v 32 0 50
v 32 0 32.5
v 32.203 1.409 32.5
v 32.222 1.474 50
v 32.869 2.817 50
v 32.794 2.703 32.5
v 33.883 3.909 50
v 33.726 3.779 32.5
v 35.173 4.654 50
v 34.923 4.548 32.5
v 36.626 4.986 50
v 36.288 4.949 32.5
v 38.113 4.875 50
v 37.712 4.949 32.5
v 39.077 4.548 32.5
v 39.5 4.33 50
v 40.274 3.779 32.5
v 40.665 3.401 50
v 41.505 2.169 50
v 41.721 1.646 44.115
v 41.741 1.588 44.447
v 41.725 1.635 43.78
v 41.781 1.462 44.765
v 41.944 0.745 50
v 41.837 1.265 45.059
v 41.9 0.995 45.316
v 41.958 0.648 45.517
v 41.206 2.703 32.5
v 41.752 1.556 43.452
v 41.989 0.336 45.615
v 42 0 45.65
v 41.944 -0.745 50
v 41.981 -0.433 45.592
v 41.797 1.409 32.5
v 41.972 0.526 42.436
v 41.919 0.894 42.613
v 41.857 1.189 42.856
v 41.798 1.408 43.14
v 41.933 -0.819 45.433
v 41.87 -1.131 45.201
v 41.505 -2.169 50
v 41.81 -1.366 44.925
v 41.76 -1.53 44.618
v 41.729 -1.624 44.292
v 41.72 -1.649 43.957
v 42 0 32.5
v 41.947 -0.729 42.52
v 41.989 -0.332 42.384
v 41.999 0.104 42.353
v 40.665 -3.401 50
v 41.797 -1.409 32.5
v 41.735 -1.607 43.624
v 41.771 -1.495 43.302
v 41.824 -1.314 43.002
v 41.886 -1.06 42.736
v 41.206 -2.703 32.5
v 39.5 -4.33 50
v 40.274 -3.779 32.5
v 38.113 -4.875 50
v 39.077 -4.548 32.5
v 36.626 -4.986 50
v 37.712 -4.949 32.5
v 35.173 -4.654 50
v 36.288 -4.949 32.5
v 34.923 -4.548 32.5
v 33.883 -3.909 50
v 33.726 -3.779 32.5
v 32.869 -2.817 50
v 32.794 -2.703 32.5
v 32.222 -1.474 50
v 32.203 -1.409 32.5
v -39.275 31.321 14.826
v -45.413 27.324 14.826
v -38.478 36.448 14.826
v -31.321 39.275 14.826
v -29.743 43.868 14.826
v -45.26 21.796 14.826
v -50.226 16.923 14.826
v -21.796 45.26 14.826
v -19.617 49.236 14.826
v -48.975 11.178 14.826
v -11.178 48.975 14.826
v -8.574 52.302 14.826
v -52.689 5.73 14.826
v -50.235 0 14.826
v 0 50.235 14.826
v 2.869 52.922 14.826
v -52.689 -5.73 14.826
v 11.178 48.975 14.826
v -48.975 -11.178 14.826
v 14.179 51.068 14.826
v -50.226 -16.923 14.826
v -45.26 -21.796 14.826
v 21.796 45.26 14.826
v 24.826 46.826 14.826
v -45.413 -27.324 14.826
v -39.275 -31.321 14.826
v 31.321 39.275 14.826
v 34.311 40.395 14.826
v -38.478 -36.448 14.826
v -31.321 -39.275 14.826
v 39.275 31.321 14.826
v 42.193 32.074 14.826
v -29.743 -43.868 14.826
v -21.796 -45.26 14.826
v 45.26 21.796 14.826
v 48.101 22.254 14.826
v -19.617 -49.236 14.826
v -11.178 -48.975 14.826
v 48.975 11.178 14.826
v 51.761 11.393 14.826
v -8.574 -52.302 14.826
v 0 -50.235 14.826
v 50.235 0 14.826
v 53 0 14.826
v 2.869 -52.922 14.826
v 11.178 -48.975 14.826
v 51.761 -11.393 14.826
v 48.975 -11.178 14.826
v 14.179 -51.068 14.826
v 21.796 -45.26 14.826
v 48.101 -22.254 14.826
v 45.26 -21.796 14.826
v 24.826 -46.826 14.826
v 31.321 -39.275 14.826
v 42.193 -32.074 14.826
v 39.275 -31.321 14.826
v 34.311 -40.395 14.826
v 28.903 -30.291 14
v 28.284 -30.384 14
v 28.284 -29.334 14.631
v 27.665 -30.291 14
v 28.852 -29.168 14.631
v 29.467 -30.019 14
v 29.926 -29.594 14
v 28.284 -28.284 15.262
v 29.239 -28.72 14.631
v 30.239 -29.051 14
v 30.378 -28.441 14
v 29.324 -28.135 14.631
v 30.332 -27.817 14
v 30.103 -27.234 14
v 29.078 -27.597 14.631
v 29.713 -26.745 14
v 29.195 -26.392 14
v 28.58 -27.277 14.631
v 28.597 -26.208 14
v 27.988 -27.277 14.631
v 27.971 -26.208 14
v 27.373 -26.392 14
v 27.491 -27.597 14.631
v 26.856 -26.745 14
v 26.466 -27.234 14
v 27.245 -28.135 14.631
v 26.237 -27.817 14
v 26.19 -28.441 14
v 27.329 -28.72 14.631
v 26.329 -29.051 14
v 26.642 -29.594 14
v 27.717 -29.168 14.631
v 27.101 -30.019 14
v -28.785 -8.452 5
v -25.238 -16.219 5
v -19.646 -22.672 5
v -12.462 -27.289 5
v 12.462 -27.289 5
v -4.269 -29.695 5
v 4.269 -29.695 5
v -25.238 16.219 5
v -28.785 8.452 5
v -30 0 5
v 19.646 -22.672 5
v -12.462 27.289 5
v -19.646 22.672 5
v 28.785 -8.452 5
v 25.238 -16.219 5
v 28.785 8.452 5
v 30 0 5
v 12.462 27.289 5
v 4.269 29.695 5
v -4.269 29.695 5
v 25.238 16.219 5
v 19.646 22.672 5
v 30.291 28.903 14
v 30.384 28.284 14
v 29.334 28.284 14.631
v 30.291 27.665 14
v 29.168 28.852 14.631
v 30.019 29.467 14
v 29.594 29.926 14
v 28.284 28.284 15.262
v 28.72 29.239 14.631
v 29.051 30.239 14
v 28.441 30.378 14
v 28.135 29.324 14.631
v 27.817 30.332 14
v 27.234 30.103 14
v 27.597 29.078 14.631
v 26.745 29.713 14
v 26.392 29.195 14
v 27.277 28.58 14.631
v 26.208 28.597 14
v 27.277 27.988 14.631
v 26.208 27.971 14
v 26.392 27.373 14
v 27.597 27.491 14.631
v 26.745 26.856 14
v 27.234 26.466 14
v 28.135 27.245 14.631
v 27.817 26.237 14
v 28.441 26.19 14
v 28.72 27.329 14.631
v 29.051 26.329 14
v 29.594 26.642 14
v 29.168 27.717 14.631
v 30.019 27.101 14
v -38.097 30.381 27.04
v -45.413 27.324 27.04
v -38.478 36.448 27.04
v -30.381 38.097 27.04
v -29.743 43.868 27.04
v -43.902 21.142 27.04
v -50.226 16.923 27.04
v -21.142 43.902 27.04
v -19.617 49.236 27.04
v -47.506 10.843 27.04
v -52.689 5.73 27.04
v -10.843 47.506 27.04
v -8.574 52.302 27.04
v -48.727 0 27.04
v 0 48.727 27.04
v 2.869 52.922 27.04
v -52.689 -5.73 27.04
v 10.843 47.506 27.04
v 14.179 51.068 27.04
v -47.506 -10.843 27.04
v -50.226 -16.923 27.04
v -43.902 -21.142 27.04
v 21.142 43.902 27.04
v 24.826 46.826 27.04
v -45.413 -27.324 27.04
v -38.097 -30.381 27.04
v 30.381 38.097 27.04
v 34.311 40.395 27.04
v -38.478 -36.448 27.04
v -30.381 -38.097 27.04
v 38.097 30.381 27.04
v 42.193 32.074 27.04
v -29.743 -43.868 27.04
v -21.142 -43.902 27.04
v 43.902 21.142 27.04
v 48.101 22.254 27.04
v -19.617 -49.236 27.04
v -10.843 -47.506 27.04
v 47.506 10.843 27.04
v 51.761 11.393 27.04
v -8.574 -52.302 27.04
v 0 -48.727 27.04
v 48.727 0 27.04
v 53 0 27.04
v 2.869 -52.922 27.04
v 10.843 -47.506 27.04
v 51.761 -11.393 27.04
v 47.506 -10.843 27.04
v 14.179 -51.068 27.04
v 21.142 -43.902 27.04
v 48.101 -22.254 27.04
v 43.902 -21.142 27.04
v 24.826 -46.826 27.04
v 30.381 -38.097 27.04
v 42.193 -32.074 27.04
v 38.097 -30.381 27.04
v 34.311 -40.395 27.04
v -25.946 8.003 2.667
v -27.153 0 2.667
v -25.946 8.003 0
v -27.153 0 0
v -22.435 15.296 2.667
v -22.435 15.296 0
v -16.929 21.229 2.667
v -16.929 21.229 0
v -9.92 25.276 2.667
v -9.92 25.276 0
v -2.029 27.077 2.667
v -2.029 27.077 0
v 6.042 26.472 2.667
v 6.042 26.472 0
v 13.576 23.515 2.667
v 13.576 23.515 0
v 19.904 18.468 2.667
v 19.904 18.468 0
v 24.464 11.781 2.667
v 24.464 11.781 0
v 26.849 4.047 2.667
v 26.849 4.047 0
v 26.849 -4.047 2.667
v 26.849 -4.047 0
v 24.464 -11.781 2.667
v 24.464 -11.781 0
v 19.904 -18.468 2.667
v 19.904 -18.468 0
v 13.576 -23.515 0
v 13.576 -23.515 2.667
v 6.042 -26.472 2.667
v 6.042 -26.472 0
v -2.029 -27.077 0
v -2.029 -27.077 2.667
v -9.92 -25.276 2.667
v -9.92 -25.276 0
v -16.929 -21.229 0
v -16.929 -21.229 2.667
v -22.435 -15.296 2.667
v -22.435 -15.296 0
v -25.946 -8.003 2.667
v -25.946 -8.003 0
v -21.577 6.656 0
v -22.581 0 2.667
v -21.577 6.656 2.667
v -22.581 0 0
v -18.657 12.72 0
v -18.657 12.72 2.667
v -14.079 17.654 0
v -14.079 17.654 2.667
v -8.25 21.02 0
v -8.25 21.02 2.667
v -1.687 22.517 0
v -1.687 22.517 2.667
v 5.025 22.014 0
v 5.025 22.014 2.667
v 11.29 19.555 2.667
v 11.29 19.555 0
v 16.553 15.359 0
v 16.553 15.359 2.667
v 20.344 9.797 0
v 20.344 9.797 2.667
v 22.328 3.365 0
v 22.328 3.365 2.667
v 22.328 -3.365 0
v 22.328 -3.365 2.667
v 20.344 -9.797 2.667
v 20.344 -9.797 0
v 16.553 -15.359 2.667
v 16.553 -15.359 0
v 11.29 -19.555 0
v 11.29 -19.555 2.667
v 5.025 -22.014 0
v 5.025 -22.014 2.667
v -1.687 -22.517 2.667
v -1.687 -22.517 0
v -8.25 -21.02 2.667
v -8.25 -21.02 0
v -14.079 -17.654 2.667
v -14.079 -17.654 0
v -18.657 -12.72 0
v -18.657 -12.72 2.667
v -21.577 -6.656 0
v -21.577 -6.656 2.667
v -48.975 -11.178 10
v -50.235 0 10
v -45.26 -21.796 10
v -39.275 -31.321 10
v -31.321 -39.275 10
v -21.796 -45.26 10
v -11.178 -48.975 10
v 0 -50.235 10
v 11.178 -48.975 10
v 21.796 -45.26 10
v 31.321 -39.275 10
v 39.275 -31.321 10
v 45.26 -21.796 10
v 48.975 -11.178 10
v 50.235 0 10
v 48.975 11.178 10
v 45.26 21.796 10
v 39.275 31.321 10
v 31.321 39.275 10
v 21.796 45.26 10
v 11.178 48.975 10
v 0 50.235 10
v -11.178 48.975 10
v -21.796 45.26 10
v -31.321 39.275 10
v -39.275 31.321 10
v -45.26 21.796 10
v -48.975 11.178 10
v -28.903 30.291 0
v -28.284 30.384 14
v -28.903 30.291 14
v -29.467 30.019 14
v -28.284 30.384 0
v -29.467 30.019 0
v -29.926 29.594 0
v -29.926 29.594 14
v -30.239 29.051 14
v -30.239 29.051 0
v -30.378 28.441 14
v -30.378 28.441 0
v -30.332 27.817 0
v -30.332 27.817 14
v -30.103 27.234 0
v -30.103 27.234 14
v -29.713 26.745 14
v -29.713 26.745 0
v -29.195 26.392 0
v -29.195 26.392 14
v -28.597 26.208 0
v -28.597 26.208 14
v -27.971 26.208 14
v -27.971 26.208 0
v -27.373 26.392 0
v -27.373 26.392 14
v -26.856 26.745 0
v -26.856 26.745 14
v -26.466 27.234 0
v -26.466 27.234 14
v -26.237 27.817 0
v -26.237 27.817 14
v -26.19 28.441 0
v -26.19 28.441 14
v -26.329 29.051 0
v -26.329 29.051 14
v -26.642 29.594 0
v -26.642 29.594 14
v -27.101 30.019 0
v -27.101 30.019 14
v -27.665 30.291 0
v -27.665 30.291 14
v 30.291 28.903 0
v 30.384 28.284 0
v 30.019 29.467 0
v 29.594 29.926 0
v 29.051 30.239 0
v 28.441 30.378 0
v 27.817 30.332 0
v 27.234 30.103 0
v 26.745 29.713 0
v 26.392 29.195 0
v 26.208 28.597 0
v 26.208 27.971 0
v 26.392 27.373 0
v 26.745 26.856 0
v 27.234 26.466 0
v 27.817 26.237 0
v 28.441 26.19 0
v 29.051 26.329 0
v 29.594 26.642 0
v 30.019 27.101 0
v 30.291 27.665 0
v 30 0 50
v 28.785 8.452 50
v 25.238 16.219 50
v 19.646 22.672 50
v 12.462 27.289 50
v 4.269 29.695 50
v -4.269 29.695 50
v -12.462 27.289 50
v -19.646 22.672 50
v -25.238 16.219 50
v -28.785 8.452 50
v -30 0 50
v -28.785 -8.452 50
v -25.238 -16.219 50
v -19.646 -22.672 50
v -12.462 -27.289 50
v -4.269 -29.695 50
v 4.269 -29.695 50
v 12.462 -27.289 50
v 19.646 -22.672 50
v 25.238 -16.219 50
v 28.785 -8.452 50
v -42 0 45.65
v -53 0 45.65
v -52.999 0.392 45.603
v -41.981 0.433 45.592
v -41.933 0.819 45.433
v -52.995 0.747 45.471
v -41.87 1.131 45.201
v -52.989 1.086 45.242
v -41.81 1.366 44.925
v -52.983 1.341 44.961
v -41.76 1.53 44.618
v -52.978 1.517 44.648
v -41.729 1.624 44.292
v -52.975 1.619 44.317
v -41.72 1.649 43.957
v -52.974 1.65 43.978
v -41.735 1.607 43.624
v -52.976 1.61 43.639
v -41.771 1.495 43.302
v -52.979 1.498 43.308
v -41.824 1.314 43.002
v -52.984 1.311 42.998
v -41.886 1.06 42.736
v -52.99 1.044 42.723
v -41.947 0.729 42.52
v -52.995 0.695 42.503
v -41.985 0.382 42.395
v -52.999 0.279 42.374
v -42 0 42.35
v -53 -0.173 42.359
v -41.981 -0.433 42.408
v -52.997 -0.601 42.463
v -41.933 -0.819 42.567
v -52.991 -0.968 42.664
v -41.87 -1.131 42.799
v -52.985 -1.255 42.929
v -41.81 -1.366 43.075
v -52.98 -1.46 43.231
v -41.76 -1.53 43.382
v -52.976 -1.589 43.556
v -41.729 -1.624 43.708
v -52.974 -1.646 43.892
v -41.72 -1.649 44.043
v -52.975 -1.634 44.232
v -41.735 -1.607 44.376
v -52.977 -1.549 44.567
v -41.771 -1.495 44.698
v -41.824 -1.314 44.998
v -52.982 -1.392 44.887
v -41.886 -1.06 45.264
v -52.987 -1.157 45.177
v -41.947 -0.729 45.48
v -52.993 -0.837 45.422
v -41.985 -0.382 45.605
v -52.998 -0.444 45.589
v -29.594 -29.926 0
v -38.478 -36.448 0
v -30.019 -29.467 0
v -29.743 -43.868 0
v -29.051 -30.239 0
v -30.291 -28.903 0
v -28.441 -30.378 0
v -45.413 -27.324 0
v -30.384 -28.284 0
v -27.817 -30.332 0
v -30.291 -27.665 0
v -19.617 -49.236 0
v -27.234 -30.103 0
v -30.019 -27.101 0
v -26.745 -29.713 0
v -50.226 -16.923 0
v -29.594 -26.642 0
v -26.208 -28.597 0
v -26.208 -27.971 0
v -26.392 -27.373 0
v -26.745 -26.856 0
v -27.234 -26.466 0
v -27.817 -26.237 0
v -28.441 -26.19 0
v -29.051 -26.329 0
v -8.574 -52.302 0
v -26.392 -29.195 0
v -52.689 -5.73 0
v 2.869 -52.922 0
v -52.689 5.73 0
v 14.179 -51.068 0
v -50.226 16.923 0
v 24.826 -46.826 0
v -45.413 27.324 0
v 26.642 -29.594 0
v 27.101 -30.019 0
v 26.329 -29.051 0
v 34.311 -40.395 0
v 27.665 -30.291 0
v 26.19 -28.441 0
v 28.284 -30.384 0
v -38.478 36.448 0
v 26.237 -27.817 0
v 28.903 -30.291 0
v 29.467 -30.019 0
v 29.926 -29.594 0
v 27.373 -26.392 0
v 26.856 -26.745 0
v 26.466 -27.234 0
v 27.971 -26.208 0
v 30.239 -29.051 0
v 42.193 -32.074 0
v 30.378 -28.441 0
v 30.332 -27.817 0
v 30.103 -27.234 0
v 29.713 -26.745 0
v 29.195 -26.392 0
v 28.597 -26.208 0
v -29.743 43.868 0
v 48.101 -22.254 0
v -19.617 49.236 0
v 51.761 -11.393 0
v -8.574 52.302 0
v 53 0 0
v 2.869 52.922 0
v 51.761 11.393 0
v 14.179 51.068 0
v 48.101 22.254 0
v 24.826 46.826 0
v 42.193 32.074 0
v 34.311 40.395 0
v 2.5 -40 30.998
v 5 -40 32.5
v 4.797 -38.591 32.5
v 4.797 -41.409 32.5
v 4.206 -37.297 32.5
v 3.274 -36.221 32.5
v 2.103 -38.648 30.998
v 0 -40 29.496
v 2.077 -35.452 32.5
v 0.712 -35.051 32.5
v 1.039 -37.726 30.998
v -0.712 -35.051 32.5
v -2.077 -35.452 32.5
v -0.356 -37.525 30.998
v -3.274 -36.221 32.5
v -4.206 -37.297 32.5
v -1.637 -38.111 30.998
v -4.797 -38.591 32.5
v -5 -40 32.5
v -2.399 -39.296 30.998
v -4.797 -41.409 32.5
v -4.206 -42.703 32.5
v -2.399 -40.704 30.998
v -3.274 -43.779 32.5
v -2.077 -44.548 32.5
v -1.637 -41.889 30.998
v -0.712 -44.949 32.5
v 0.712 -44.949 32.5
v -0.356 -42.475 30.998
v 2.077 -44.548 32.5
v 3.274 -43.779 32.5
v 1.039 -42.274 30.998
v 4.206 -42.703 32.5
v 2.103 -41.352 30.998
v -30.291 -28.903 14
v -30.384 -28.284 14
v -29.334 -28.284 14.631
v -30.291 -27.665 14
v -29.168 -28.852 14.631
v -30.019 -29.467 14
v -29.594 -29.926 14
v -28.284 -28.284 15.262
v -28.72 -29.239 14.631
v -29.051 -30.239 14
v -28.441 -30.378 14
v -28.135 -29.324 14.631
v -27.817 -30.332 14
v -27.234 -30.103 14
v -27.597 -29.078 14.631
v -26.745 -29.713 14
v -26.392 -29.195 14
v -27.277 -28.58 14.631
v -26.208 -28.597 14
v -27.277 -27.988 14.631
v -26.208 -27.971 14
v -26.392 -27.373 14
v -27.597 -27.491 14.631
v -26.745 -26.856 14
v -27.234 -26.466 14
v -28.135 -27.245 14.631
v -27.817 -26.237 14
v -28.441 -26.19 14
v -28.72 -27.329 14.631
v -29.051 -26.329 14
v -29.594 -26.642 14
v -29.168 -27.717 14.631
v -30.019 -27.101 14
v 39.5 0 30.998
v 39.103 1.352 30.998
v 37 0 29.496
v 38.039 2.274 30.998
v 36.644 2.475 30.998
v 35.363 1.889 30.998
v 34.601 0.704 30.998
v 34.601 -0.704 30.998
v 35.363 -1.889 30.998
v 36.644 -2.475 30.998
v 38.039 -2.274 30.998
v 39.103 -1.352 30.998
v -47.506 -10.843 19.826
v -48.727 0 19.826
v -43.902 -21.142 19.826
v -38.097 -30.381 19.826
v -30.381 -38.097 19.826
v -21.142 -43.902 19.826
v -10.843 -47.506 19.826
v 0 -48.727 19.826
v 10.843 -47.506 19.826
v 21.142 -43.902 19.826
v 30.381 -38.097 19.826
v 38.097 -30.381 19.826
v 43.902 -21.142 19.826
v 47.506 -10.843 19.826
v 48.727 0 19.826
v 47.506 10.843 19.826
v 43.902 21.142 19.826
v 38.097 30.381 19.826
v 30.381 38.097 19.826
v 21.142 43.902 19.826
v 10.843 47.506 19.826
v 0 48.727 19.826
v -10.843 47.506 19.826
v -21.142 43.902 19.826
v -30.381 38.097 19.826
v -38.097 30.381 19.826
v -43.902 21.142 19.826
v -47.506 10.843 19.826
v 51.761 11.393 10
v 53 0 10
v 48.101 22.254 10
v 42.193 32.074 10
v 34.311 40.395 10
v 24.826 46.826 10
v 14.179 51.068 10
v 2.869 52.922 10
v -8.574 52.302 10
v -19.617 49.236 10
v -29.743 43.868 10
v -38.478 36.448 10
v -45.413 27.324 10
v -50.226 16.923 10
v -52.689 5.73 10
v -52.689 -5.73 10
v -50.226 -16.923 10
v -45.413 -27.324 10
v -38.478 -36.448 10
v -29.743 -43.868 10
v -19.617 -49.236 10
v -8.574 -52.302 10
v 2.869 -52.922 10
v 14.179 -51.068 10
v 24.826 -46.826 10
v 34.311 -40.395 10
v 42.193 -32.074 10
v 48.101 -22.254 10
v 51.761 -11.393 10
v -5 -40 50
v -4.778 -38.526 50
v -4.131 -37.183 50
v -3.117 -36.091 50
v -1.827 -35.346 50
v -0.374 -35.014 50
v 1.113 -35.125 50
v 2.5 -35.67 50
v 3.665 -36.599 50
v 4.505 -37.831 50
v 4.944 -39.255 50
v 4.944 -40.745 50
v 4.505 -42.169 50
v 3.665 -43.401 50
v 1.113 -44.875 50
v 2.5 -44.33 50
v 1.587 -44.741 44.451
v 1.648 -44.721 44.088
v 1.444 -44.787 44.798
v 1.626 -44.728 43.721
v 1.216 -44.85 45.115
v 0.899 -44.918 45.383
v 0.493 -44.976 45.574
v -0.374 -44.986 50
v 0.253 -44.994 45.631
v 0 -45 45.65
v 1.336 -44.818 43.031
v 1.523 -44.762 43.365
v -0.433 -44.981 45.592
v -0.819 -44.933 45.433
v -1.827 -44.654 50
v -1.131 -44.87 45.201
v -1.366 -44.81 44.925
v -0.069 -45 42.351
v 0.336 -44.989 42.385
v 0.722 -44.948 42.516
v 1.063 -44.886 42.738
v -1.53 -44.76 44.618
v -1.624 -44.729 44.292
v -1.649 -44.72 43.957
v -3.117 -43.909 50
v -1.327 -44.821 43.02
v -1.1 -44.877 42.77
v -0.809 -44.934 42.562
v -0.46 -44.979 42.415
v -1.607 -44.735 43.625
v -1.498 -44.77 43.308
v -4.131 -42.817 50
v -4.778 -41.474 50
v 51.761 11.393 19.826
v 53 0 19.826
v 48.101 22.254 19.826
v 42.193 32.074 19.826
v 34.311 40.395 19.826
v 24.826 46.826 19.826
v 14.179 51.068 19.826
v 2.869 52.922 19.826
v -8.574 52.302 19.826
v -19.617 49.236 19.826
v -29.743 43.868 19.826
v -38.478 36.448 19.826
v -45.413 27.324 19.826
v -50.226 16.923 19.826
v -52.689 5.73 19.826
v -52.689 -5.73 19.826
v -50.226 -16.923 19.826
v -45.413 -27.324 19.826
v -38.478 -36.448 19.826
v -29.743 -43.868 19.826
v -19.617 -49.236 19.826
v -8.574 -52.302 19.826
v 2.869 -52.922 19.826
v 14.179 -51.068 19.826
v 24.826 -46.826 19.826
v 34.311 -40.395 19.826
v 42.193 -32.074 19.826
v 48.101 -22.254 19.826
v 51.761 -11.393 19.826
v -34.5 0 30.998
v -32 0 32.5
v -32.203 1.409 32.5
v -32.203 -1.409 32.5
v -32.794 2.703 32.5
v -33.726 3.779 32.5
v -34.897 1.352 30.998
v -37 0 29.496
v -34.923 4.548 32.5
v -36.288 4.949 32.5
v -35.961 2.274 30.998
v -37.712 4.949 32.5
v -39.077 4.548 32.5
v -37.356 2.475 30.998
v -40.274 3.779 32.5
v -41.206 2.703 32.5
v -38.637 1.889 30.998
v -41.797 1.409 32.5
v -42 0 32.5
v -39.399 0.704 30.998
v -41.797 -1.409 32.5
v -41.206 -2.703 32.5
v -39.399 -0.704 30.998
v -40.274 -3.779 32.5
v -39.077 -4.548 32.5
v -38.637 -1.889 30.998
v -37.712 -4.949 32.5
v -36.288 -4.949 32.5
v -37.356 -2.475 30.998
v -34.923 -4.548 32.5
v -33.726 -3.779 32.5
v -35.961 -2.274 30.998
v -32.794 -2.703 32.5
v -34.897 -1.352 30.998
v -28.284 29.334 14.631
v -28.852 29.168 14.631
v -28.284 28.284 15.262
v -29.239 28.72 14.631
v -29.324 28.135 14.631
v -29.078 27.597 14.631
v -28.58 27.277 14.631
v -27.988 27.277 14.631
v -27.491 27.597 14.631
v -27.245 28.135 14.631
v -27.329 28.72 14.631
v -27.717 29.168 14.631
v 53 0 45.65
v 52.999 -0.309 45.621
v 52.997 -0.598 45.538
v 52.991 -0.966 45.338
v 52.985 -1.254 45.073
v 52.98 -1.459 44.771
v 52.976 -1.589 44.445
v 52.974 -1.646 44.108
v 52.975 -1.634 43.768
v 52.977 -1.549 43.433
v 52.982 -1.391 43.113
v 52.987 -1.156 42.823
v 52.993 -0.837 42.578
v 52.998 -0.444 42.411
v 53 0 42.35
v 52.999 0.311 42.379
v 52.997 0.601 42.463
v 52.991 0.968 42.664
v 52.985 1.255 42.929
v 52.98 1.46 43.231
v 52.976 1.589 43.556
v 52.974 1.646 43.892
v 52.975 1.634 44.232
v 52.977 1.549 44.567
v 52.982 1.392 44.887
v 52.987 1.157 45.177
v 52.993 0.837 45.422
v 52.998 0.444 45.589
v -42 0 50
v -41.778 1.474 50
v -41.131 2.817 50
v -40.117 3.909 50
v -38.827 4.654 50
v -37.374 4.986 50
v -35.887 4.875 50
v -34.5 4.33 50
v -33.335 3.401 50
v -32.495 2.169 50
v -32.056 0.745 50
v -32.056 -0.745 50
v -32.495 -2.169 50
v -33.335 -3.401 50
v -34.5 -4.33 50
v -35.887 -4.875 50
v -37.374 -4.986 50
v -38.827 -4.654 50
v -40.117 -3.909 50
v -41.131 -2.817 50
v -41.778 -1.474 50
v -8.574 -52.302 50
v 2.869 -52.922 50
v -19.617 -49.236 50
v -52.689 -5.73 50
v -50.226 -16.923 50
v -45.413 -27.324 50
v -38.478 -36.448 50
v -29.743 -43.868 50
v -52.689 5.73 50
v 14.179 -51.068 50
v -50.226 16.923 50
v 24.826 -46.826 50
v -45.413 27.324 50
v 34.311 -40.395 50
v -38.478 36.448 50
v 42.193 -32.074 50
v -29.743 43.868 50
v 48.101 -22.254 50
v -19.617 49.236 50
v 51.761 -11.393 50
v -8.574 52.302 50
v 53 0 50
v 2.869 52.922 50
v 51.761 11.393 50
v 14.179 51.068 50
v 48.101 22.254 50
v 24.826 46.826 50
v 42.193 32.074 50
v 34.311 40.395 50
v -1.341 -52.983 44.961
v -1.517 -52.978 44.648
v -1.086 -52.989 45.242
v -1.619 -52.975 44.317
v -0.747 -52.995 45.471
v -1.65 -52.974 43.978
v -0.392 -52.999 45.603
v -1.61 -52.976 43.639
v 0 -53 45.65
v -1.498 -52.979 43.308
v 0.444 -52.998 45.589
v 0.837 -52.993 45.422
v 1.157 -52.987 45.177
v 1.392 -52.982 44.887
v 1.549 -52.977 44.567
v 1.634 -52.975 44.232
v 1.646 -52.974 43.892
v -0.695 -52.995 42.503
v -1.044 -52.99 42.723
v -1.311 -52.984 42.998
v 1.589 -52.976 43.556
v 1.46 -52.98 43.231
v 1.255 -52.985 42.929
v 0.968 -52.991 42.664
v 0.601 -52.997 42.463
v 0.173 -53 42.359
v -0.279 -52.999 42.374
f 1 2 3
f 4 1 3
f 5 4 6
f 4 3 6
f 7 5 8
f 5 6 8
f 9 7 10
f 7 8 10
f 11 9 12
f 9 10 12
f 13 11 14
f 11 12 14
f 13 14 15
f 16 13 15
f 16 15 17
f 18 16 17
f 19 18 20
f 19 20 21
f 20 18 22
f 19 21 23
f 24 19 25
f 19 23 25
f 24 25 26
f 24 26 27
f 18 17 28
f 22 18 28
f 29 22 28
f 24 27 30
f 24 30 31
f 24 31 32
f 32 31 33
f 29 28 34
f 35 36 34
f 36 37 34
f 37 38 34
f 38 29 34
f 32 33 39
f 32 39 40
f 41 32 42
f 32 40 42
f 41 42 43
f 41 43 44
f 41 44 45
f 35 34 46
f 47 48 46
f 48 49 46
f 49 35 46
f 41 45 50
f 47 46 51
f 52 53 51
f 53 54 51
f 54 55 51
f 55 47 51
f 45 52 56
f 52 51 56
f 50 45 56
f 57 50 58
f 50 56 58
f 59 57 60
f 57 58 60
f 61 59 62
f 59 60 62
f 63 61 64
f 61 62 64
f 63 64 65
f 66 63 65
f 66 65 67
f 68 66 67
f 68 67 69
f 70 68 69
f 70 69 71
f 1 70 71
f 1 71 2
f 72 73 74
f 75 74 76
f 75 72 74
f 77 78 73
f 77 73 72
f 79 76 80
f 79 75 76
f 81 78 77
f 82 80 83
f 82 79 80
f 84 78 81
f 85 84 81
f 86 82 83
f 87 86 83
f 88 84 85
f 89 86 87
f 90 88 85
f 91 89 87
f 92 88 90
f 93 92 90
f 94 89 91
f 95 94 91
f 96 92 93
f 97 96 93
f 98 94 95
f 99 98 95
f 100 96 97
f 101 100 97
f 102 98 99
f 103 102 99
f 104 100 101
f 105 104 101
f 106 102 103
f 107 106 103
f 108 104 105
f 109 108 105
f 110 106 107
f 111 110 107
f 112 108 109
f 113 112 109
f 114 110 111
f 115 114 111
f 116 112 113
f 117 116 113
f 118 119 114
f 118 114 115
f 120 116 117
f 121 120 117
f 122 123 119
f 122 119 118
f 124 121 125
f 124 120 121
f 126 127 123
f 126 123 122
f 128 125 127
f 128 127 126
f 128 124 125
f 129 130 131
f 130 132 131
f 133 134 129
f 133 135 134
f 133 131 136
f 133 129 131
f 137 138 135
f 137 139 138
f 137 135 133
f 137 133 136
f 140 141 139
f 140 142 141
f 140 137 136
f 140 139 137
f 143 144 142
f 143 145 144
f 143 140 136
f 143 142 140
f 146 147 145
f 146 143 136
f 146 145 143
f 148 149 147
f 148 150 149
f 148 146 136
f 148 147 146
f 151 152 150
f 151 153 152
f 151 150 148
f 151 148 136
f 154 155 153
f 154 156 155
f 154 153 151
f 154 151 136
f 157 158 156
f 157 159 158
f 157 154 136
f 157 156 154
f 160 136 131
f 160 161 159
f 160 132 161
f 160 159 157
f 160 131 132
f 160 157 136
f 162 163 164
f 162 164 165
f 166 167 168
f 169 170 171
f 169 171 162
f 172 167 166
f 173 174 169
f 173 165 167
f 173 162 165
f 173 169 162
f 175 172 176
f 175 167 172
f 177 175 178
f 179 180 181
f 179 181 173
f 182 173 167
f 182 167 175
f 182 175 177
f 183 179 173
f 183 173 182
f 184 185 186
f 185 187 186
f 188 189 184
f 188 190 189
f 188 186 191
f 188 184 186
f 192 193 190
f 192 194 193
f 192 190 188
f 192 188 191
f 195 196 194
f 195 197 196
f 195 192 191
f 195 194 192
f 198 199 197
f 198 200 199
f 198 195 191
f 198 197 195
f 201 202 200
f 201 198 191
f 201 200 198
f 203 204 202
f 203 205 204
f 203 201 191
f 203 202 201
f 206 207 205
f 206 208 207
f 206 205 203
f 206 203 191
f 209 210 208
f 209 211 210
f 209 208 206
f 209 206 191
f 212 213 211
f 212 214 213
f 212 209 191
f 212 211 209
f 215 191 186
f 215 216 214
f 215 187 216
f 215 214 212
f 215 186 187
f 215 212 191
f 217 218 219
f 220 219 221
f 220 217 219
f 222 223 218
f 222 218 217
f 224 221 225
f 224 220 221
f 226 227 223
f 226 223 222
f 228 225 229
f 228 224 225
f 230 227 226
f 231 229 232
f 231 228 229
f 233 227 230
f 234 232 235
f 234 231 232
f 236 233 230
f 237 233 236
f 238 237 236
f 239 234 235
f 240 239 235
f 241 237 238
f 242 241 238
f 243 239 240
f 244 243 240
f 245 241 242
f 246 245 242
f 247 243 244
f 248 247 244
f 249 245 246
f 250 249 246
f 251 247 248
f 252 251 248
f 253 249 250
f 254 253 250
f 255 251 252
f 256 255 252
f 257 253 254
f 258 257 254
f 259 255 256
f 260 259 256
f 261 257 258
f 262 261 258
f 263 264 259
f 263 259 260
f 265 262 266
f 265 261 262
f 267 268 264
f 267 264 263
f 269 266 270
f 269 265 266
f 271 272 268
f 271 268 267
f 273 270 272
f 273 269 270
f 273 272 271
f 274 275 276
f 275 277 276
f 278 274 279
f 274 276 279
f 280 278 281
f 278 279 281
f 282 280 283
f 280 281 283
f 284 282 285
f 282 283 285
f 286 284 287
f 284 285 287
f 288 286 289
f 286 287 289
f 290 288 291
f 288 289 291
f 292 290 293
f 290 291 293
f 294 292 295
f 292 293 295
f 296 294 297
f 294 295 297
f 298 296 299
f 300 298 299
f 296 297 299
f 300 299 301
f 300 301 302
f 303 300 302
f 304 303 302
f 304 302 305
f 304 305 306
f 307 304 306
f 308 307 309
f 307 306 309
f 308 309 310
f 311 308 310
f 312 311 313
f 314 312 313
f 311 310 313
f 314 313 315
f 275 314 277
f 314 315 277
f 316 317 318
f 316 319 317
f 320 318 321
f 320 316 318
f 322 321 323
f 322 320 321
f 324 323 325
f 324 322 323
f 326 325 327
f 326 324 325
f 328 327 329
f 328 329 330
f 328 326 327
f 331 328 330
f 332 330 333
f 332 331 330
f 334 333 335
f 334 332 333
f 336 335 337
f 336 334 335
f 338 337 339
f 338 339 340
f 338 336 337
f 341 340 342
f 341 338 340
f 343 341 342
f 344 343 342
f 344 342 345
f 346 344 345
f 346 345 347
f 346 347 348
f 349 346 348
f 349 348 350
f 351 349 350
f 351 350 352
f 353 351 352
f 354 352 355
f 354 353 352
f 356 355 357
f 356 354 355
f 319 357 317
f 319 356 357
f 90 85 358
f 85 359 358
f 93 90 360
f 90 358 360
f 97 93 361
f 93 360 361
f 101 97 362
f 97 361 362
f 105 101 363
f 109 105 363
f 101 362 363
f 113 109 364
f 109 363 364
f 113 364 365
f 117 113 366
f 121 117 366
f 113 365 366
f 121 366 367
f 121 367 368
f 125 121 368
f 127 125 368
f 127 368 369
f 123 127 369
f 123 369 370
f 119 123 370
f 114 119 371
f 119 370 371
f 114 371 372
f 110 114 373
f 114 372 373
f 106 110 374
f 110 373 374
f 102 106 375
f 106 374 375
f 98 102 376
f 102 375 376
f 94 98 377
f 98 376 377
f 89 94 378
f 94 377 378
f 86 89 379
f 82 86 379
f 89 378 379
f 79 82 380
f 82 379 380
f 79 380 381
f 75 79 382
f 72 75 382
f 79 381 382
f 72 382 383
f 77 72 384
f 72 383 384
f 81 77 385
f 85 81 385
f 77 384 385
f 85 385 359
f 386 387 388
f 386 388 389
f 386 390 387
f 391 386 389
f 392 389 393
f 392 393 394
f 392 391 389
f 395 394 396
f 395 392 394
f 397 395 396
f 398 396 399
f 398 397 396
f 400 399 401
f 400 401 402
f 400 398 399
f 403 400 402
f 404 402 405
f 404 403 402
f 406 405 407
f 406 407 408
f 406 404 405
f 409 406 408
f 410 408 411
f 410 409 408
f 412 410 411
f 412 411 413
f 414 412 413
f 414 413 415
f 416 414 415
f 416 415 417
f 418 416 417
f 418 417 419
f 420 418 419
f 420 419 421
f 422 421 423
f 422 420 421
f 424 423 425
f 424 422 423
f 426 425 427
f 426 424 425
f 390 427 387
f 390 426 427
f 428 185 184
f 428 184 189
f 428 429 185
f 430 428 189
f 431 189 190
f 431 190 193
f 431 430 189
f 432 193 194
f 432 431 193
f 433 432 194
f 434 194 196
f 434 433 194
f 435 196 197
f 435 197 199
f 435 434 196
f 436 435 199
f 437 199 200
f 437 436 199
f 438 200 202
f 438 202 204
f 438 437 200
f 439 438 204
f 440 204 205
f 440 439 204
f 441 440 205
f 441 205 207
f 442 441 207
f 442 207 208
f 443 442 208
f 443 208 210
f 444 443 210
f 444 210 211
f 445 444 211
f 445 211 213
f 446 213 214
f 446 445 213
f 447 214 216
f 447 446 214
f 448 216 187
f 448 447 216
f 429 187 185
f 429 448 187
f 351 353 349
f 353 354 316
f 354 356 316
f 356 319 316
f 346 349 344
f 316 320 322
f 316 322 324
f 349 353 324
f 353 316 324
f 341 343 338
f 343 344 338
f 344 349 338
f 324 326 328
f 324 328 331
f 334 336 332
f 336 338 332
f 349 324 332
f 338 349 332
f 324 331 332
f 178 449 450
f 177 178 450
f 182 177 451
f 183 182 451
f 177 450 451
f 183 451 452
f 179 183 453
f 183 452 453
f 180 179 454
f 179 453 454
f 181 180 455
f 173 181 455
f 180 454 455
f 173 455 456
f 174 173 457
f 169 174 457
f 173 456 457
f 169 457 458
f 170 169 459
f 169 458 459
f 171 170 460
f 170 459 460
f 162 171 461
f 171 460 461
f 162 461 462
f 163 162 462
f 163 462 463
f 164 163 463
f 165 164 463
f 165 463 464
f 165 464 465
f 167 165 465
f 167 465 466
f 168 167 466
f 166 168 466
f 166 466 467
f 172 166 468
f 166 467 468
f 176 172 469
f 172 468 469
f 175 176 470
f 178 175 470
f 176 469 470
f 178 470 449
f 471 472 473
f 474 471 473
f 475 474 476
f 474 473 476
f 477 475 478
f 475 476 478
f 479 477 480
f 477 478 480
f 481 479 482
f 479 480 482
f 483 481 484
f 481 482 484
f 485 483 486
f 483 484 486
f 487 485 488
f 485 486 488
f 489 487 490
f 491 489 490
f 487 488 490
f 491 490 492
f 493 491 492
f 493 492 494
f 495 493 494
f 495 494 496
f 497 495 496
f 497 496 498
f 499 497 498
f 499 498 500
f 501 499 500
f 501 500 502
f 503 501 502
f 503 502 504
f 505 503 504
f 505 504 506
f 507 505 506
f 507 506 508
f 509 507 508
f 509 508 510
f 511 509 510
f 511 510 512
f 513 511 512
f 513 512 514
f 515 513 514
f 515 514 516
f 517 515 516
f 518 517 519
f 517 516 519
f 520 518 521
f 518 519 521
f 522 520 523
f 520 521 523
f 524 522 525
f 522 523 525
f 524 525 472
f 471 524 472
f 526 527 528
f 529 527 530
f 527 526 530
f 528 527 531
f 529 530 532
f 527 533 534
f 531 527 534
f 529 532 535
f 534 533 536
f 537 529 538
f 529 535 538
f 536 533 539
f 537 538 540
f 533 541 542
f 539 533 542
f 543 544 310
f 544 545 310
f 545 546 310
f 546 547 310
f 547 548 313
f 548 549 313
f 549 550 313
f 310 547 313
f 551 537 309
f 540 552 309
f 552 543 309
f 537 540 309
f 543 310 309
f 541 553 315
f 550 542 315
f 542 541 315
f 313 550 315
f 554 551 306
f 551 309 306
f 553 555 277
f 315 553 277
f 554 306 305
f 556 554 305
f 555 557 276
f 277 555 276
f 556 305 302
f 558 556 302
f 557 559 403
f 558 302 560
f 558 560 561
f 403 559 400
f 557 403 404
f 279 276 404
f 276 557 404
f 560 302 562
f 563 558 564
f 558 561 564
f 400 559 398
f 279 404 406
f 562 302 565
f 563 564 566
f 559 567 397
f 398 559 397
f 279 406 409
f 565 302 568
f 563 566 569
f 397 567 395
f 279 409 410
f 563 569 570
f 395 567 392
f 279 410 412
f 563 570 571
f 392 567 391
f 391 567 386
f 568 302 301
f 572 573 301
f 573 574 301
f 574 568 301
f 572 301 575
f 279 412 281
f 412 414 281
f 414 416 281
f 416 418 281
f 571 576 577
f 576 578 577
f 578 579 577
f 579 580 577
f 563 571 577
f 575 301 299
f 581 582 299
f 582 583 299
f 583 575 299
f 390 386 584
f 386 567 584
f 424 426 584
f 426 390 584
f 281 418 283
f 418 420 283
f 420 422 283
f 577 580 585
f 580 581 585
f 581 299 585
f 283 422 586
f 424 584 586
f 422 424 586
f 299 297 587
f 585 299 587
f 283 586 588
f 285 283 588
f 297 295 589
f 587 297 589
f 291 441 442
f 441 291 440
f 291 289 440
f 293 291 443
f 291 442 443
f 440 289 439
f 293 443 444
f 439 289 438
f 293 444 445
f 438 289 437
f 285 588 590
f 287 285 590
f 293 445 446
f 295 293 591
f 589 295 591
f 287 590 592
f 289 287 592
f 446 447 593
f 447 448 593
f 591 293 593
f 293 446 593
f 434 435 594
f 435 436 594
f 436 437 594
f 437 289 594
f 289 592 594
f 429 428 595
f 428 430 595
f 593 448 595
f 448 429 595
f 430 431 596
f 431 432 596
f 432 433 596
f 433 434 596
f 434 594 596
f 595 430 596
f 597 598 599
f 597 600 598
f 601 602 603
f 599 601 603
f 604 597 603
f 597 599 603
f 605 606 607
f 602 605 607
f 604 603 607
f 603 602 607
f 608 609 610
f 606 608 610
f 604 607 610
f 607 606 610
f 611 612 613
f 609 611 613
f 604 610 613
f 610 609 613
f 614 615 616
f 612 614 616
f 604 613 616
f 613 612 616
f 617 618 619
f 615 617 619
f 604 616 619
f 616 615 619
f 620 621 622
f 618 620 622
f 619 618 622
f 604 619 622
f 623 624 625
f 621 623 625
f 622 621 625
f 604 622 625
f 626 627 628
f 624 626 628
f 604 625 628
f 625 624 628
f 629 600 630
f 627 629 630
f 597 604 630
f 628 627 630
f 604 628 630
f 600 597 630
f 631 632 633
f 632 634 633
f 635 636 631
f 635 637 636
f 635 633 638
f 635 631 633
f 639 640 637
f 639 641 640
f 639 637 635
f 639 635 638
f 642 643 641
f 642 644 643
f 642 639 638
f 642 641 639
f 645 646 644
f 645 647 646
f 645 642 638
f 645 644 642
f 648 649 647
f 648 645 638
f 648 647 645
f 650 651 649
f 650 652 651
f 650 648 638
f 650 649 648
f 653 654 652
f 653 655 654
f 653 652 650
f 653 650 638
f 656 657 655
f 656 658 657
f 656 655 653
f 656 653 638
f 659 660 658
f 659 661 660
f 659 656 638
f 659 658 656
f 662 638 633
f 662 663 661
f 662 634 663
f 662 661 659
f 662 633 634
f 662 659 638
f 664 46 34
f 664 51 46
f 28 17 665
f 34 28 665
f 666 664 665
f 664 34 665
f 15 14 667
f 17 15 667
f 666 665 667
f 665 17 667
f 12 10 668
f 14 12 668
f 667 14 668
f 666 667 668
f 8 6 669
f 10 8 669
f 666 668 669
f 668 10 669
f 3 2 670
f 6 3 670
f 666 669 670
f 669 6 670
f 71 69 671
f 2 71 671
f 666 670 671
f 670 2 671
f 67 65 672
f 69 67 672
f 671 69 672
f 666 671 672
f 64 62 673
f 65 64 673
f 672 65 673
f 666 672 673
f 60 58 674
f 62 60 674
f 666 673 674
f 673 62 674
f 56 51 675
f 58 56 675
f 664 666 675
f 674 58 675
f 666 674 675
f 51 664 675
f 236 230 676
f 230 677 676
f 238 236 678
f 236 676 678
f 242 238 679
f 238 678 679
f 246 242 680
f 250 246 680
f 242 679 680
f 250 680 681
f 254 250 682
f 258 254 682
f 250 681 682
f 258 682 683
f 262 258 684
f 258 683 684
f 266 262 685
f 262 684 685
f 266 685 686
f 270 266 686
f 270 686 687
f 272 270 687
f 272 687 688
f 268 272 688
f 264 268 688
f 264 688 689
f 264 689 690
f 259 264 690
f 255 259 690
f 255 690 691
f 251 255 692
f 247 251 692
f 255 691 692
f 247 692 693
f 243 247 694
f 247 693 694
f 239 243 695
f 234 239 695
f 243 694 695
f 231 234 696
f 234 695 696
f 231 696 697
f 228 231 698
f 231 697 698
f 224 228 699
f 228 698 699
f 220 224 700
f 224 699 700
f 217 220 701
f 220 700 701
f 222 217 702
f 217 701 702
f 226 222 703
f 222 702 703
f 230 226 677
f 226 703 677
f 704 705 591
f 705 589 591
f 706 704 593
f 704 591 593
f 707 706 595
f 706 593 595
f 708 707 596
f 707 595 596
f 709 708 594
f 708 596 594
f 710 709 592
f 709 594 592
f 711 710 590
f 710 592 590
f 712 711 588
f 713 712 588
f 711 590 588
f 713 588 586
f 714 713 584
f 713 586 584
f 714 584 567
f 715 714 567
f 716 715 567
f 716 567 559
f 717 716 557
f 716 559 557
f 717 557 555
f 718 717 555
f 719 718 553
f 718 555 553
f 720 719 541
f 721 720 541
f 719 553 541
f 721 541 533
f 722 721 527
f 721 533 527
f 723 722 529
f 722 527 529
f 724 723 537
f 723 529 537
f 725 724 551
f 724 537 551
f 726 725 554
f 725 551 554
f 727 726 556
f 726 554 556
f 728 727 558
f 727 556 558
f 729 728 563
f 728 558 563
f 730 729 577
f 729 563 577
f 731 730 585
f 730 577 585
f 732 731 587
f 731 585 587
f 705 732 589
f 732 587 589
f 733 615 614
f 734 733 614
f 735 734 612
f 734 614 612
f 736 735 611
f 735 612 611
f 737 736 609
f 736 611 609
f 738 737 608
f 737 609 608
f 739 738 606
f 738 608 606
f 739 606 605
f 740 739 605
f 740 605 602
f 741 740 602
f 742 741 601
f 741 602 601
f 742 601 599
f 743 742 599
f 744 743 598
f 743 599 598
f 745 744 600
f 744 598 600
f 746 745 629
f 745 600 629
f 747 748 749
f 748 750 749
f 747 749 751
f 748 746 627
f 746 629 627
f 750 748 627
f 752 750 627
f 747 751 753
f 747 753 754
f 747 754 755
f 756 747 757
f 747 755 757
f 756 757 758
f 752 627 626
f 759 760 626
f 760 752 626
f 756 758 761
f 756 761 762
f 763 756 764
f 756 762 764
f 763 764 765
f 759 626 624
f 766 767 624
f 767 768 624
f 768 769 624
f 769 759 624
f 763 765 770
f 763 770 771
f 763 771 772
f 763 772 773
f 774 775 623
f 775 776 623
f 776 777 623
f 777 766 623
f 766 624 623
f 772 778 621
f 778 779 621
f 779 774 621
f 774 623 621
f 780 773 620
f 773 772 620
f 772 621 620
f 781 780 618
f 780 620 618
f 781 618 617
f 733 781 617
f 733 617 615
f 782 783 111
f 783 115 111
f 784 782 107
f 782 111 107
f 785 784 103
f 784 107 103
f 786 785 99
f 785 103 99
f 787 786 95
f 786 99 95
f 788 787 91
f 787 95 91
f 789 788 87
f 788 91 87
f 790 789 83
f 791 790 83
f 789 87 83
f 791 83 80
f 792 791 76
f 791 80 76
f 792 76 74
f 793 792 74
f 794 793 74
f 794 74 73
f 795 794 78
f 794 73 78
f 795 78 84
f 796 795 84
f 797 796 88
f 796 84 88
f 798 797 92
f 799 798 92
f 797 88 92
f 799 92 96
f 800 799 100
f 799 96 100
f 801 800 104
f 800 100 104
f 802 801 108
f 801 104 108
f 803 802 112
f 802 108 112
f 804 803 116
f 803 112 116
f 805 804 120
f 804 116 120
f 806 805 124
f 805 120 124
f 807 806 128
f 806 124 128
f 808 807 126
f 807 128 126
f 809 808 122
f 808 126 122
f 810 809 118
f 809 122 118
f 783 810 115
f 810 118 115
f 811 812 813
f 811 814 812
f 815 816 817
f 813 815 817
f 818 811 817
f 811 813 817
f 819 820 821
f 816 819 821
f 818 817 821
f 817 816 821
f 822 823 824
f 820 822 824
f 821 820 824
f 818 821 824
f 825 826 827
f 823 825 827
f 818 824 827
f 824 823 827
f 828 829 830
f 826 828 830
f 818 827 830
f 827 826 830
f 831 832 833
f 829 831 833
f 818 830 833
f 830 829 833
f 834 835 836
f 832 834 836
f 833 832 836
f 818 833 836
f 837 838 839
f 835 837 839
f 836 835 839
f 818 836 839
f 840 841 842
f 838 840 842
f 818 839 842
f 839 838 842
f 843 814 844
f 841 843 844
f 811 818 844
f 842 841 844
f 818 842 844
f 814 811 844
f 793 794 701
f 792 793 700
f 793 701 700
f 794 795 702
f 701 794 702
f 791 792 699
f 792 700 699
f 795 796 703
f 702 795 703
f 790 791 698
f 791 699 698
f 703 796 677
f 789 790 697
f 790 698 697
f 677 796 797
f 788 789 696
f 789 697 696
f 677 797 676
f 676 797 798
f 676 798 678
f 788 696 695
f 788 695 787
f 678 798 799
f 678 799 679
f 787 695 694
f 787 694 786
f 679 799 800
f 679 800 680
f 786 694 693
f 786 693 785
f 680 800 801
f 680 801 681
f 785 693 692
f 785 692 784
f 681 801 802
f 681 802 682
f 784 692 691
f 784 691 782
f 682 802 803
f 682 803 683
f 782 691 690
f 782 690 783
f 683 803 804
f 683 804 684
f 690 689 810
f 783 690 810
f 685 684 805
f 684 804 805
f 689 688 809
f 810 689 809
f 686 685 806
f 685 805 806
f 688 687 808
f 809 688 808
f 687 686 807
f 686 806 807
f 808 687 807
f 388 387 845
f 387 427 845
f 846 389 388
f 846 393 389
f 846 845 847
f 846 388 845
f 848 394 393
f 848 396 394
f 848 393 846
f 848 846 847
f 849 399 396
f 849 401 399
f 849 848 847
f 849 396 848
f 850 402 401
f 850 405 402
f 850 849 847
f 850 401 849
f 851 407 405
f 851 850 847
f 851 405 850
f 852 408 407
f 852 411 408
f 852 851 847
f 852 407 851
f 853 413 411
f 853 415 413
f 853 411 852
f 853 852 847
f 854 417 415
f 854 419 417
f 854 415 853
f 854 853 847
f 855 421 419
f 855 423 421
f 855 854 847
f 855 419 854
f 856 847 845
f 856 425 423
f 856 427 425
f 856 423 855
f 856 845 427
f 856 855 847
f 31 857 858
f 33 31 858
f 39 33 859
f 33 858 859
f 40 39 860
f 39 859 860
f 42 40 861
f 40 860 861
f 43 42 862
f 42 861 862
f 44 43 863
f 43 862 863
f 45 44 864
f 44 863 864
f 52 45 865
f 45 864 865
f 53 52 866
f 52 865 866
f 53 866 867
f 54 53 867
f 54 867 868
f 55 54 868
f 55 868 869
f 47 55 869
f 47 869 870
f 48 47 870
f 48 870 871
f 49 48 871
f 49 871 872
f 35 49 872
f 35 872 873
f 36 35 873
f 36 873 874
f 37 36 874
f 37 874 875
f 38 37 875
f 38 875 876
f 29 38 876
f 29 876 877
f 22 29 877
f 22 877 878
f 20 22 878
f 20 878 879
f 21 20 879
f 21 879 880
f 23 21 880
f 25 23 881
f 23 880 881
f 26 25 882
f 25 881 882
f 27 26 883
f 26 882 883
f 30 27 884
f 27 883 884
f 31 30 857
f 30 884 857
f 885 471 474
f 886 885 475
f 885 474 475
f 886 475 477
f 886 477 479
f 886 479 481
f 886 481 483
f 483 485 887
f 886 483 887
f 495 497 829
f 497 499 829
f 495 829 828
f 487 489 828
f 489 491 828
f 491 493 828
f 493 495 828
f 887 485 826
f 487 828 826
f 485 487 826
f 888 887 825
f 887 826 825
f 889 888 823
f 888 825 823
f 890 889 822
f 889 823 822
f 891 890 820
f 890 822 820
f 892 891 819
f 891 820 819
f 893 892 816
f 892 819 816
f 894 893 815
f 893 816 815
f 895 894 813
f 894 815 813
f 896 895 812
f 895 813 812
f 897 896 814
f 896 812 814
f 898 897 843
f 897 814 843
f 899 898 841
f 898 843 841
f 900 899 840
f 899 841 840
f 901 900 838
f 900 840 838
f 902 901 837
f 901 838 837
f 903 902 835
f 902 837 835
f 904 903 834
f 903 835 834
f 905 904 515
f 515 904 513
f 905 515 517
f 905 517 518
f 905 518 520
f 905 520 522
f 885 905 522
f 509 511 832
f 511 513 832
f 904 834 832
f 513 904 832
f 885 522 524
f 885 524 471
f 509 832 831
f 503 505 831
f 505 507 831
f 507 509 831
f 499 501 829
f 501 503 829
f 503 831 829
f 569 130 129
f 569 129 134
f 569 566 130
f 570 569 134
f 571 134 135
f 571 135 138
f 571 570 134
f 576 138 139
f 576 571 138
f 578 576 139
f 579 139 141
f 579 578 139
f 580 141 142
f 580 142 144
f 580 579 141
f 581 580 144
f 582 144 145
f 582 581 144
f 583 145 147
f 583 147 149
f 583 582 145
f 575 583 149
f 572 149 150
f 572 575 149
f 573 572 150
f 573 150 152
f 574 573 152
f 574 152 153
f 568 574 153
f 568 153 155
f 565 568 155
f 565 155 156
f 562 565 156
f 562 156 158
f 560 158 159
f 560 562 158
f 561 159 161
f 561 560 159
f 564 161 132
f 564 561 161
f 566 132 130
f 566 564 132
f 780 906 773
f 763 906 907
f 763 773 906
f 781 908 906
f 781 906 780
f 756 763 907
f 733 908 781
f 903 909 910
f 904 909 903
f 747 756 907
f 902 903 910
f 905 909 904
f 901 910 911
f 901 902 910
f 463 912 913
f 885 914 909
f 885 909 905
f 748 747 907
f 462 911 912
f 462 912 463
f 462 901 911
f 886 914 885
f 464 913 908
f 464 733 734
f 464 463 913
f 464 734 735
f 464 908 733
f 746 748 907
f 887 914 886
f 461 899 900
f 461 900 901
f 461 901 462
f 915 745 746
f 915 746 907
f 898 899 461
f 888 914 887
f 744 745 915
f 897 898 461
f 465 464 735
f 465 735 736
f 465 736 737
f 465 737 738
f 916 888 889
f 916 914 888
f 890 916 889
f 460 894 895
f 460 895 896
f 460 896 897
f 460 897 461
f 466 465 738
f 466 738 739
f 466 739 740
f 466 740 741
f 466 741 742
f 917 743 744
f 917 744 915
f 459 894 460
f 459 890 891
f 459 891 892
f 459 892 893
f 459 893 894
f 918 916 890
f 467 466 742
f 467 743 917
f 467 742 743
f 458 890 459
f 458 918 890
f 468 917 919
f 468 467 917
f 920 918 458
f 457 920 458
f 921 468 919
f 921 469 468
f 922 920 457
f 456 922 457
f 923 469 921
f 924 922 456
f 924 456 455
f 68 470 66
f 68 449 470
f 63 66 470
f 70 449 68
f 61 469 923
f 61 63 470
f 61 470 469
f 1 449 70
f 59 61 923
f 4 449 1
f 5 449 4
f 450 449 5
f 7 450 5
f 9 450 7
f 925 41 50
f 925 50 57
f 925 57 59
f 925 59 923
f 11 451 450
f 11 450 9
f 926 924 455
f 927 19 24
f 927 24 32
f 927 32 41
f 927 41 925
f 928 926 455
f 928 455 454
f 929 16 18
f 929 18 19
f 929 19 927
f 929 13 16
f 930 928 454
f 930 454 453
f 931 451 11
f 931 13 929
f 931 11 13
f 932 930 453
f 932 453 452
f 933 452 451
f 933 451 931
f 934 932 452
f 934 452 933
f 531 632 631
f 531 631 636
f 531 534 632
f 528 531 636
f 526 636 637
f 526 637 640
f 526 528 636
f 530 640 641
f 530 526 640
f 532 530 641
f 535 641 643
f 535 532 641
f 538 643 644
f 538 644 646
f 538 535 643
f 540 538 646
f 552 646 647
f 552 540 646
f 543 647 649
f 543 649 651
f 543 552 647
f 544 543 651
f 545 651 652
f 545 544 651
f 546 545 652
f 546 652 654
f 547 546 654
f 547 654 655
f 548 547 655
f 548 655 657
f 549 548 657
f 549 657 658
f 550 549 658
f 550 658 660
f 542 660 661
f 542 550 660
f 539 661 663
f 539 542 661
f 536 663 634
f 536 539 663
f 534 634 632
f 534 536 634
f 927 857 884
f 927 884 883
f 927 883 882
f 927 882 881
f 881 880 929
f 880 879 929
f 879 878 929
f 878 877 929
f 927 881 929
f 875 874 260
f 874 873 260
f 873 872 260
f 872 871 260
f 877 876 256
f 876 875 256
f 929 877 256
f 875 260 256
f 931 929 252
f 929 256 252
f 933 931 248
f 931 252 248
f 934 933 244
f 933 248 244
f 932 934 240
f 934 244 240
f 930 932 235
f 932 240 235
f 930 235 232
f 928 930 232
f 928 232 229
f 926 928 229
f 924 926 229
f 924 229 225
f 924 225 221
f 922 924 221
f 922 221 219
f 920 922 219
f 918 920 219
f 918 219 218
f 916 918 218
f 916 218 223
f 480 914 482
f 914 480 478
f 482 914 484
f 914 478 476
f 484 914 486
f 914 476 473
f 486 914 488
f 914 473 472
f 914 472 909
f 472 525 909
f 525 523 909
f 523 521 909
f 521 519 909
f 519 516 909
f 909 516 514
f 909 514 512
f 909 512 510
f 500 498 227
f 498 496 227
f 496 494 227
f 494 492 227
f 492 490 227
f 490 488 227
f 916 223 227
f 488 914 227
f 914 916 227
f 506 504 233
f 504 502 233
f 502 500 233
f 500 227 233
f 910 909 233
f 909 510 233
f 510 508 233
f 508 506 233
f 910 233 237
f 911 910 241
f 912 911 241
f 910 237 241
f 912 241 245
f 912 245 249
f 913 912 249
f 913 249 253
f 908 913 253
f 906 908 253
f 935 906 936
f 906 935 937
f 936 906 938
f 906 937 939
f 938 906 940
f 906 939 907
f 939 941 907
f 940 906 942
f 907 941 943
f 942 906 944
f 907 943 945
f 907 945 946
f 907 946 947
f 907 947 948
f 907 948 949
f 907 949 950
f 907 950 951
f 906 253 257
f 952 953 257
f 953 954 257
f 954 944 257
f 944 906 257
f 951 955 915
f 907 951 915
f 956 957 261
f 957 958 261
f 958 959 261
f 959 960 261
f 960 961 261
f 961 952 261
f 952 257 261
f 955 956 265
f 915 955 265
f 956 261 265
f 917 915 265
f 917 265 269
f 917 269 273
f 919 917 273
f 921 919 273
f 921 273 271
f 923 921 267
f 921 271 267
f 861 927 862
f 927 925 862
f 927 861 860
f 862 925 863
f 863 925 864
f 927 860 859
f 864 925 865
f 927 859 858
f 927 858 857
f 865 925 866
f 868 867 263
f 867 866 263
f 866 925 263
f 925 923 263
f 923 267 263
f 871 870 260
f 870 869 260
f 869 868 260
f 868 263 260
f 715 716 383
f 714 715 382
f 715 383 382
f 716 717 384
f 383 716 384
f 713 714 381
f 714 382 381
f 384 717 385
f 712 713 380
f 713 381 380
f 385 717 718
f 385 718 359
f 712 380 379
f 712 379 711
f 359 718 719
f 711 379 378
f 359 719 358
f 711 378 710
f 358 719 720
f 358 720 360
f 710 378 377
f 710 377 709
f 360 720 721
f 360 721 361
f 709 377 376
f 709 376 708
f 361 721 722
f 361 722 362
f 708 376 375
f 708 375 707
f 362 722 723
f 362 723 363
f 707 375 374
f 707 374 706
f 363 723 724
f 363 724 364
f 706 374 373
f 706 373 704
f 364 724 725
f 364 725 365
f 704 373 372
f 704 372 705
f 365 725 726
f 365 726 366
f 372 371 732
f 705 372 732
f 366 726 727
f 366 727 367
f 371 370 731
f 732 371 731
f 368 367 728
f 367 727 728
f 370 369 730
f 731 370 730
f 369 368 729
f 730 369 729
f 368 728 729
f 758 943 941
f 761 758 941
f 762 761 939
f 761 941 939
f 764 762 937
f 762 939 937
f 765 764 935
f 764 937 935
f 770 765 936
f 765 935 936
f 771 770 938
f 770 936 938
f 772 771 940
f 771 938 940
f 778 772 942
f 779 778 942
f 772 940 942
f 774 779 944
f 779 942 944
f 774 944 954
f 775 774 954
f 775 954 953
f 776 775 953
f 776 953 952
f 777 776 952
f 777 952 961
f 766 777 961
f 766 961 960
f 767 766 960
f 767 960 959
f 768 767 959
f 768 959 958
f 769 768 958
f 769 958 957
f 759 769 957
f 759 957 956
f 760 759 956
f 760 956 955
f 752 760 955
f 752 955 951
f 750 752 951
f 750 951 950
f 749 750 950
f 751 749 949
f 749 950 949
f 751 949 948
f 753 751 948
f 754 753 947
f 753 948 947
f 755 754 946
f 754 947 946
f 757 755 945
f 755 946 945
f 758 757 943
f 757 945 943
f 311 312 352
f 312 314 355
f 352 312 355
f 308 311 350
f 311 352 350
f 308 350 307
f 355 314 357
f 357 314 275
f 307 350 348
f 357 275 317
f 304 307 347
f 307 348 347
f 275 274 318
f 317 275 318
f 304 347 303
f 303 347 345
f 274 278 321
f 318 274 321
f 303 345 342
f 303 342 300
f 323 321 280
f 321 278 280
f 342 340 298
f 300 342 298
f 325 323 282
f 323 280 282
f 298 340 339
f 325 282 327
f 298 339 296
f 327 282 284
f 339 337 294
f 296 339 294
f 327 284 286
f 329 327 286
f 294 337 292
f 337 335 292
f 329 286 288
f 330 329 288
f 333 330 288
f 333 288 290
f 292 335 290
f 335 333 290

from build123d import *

# Parameters (mm, degrees)
SKETCH1_R                      = 53
BOSS_EXTRUDE1_DEPTH            = 50
F_10_0_10_DIAMETER_HOLE2_D     = 10
F_10_0_10_DIAMETER_HOLE2_DEPTH = 17.5
F_10_0_10_DIAMETER_HOLE2_TIP   = 3.004303095
M4_TAPPED_HOLE1_REACH          = 130.627
M4_TAPPED_HOLE1_BORE_R         = 1.65
CIRPATTERN1_COUNT              = 3
CIRPATTERN1_ANGLE              = 180
SKETCH11_R                     = 30
CUT_EXTRUDE2_DEPTH             = 45
SKETCH12_W                     = 4.826
SKETCH12_H                     = 2.76515
SKETCH12_W_2                   = 7.2136
SKETCH12_H_2                   = 4.27264
SKETCH14_W                     = 2.667
SKETCH14_H                     = 4.572
CIRPATTERN2_COUNT              = 4


with BuildPart() as part:
    # Sketch1 → Boss-Extrude1 (new body)
    with BuildSketch(Plane.XY):
        Circle(SKETCH1_R)
    extrude(amount=BOSS_EXTRUDE1_DEPTH)

    # Ø10.0 (10) Diameter Hole2
    with Locations(Plane.XY.offset(50)):
        with Locations((-37, 0), (37, 0), (0, -40)):
            Hole(F_10_0_10_DIAMETER_HOLE2_D / 2, depth=F_10_0_10_DIAMETER_HOLE2_DEPTH)
            with Locations((0, 0, -(F_10_0_10_DIAMETER_HOLE2_DEPTH + F_10_0_10_DIAMETER_HOLE2_TIP / 2))):  # 118° drill point
                Cone(0, F_10_0_10_DIAMETER_HOLE2_D / 2, F_10_0_10_DIAMETER_HOLE2_TIP, mode=Mode.SUBTRACT)

    # M4 Tapped Hole1 bore → M4 Tapped Hole1 (cut, up to next)
    with BuildSketch(Plane.ZY.offset(53), mode=Mode.PRIVATE) as m4_tapped_hole1_sk1:
        with Locations((44, 0)):
            Circle(M4_TAPPED_HOLE1_BORE_R)
    m4_tapped_hole1_tool1 = extrude(m4_tapped_hole1_sk1.sketch, amount=-M4_TAPPED_HOLE1_REACH, mode=Mode.PRIVATE) & part.part
    m4_tapped_hole1 = m4_tapped_hole1_tool1.solids().sort_by_distance((-53, 0, 44))[0]
    add(m4_tapped_hole1, mode=Mode.SUBTRACT)

    # CirPattern1: M4 Tapped Hole1 ×3 about axis
    cirpattern1_axis = Axis((0, 0, 50), (0, 0, 1))
    for i in range(1, CIRPATTERN1_COUNT):
        add(m4_tapped_hole1.rotate(cirpattern1_axis, i * CIRPATTERN1_ANGLE / (CIRPATTERN1_COUNT - 1)), mode=Mode.SUBTRACT)

    # Sketch11 → Cut-Extrude2 (cut)
    with BuildSketch(Plane.XY.offset(50)):
        Circle(SKETCH11_R)
    extrude(amount=-CUT_EXTRUDE2_DEPTH, mode=Mode.SUBTRACT)

    # Sketch12 → Cut-Revolve1 (revolve, cut)
    with BuildSketch(Plane(origin=(0, 0, 0), x_dir=(0, 0, -1), z_dir=(1, 0, 0)), mode=Mode.PRIVATE) as cut_revolve1_sk:
        with Locations((-12.413, 51.617425)):
            Rectangle(SKETCH12_W, SKETCH12_H)
        with Locations((-23.4328, 50.86368)):
            Rectangle(SKETCH12_W_2, SKETCH12_H_2)
    revolve(cut_revolve1_sk.sketch.rotate(Axis((0, 0, 0), (0, 0, 1)), 90), axis=Axis((0, 0, 0), (0, 0, 1)), mode=Mode.SUBTRACT)

    # Sketch14 → Cut-Revolve2 (revolve, cut)
    with BuildSketch(Plane(origin=(0, 0, 0), x_dir=(0, 0, -1), z_dir=(1, 0, 0)), mode=Mode.PRIVATE) as cut_revolve2_sk:
        with Locations((-1.3335, 24.8666)):
            Rectangle(SKETCH14_W, SKETCH14_H)
    revolve(cut_revolve2_sk.sketch.rotate(Axis((0, 0, 0), (0, 0, -1)), 270), axis=Axis((0, 0, 0), (0, 0, -1)), mode=Mode.SUBTRACT)

    # Sketch17 → M5 Tapped Hole1 (revolve, cut)
    with BuildSketch(Plane(origin=(-28.284271247, 28.284271247, 0), x_dir=(0, 1, 0), z_dir=(1, 0, 0))):
        Polygon((0, 0), (0, 15.2618073), (2.1, 14), (2.1, 0), align=None)
    m5_tapped_hole1 = revolve(axis=Axis((-28.284271247, 28.284271247, -6.35), (0, 0, 1)), mode=Mode.SUBTRACT)

    # CirPattern2: M5 Tapped Hole1 ×4 about axis
    cirpattern2_axis = Axis((0, 0, 0), (0, 0, 1))
    for i in range(1, CIRPATTERN2_COUNT):
        add(m5_tapped_hole1.rotate(cirpattern2_axis, i * 360 / CIRPATTERN2_COUNT), mode=Mode.SUBTRACT)


solid = part.part
